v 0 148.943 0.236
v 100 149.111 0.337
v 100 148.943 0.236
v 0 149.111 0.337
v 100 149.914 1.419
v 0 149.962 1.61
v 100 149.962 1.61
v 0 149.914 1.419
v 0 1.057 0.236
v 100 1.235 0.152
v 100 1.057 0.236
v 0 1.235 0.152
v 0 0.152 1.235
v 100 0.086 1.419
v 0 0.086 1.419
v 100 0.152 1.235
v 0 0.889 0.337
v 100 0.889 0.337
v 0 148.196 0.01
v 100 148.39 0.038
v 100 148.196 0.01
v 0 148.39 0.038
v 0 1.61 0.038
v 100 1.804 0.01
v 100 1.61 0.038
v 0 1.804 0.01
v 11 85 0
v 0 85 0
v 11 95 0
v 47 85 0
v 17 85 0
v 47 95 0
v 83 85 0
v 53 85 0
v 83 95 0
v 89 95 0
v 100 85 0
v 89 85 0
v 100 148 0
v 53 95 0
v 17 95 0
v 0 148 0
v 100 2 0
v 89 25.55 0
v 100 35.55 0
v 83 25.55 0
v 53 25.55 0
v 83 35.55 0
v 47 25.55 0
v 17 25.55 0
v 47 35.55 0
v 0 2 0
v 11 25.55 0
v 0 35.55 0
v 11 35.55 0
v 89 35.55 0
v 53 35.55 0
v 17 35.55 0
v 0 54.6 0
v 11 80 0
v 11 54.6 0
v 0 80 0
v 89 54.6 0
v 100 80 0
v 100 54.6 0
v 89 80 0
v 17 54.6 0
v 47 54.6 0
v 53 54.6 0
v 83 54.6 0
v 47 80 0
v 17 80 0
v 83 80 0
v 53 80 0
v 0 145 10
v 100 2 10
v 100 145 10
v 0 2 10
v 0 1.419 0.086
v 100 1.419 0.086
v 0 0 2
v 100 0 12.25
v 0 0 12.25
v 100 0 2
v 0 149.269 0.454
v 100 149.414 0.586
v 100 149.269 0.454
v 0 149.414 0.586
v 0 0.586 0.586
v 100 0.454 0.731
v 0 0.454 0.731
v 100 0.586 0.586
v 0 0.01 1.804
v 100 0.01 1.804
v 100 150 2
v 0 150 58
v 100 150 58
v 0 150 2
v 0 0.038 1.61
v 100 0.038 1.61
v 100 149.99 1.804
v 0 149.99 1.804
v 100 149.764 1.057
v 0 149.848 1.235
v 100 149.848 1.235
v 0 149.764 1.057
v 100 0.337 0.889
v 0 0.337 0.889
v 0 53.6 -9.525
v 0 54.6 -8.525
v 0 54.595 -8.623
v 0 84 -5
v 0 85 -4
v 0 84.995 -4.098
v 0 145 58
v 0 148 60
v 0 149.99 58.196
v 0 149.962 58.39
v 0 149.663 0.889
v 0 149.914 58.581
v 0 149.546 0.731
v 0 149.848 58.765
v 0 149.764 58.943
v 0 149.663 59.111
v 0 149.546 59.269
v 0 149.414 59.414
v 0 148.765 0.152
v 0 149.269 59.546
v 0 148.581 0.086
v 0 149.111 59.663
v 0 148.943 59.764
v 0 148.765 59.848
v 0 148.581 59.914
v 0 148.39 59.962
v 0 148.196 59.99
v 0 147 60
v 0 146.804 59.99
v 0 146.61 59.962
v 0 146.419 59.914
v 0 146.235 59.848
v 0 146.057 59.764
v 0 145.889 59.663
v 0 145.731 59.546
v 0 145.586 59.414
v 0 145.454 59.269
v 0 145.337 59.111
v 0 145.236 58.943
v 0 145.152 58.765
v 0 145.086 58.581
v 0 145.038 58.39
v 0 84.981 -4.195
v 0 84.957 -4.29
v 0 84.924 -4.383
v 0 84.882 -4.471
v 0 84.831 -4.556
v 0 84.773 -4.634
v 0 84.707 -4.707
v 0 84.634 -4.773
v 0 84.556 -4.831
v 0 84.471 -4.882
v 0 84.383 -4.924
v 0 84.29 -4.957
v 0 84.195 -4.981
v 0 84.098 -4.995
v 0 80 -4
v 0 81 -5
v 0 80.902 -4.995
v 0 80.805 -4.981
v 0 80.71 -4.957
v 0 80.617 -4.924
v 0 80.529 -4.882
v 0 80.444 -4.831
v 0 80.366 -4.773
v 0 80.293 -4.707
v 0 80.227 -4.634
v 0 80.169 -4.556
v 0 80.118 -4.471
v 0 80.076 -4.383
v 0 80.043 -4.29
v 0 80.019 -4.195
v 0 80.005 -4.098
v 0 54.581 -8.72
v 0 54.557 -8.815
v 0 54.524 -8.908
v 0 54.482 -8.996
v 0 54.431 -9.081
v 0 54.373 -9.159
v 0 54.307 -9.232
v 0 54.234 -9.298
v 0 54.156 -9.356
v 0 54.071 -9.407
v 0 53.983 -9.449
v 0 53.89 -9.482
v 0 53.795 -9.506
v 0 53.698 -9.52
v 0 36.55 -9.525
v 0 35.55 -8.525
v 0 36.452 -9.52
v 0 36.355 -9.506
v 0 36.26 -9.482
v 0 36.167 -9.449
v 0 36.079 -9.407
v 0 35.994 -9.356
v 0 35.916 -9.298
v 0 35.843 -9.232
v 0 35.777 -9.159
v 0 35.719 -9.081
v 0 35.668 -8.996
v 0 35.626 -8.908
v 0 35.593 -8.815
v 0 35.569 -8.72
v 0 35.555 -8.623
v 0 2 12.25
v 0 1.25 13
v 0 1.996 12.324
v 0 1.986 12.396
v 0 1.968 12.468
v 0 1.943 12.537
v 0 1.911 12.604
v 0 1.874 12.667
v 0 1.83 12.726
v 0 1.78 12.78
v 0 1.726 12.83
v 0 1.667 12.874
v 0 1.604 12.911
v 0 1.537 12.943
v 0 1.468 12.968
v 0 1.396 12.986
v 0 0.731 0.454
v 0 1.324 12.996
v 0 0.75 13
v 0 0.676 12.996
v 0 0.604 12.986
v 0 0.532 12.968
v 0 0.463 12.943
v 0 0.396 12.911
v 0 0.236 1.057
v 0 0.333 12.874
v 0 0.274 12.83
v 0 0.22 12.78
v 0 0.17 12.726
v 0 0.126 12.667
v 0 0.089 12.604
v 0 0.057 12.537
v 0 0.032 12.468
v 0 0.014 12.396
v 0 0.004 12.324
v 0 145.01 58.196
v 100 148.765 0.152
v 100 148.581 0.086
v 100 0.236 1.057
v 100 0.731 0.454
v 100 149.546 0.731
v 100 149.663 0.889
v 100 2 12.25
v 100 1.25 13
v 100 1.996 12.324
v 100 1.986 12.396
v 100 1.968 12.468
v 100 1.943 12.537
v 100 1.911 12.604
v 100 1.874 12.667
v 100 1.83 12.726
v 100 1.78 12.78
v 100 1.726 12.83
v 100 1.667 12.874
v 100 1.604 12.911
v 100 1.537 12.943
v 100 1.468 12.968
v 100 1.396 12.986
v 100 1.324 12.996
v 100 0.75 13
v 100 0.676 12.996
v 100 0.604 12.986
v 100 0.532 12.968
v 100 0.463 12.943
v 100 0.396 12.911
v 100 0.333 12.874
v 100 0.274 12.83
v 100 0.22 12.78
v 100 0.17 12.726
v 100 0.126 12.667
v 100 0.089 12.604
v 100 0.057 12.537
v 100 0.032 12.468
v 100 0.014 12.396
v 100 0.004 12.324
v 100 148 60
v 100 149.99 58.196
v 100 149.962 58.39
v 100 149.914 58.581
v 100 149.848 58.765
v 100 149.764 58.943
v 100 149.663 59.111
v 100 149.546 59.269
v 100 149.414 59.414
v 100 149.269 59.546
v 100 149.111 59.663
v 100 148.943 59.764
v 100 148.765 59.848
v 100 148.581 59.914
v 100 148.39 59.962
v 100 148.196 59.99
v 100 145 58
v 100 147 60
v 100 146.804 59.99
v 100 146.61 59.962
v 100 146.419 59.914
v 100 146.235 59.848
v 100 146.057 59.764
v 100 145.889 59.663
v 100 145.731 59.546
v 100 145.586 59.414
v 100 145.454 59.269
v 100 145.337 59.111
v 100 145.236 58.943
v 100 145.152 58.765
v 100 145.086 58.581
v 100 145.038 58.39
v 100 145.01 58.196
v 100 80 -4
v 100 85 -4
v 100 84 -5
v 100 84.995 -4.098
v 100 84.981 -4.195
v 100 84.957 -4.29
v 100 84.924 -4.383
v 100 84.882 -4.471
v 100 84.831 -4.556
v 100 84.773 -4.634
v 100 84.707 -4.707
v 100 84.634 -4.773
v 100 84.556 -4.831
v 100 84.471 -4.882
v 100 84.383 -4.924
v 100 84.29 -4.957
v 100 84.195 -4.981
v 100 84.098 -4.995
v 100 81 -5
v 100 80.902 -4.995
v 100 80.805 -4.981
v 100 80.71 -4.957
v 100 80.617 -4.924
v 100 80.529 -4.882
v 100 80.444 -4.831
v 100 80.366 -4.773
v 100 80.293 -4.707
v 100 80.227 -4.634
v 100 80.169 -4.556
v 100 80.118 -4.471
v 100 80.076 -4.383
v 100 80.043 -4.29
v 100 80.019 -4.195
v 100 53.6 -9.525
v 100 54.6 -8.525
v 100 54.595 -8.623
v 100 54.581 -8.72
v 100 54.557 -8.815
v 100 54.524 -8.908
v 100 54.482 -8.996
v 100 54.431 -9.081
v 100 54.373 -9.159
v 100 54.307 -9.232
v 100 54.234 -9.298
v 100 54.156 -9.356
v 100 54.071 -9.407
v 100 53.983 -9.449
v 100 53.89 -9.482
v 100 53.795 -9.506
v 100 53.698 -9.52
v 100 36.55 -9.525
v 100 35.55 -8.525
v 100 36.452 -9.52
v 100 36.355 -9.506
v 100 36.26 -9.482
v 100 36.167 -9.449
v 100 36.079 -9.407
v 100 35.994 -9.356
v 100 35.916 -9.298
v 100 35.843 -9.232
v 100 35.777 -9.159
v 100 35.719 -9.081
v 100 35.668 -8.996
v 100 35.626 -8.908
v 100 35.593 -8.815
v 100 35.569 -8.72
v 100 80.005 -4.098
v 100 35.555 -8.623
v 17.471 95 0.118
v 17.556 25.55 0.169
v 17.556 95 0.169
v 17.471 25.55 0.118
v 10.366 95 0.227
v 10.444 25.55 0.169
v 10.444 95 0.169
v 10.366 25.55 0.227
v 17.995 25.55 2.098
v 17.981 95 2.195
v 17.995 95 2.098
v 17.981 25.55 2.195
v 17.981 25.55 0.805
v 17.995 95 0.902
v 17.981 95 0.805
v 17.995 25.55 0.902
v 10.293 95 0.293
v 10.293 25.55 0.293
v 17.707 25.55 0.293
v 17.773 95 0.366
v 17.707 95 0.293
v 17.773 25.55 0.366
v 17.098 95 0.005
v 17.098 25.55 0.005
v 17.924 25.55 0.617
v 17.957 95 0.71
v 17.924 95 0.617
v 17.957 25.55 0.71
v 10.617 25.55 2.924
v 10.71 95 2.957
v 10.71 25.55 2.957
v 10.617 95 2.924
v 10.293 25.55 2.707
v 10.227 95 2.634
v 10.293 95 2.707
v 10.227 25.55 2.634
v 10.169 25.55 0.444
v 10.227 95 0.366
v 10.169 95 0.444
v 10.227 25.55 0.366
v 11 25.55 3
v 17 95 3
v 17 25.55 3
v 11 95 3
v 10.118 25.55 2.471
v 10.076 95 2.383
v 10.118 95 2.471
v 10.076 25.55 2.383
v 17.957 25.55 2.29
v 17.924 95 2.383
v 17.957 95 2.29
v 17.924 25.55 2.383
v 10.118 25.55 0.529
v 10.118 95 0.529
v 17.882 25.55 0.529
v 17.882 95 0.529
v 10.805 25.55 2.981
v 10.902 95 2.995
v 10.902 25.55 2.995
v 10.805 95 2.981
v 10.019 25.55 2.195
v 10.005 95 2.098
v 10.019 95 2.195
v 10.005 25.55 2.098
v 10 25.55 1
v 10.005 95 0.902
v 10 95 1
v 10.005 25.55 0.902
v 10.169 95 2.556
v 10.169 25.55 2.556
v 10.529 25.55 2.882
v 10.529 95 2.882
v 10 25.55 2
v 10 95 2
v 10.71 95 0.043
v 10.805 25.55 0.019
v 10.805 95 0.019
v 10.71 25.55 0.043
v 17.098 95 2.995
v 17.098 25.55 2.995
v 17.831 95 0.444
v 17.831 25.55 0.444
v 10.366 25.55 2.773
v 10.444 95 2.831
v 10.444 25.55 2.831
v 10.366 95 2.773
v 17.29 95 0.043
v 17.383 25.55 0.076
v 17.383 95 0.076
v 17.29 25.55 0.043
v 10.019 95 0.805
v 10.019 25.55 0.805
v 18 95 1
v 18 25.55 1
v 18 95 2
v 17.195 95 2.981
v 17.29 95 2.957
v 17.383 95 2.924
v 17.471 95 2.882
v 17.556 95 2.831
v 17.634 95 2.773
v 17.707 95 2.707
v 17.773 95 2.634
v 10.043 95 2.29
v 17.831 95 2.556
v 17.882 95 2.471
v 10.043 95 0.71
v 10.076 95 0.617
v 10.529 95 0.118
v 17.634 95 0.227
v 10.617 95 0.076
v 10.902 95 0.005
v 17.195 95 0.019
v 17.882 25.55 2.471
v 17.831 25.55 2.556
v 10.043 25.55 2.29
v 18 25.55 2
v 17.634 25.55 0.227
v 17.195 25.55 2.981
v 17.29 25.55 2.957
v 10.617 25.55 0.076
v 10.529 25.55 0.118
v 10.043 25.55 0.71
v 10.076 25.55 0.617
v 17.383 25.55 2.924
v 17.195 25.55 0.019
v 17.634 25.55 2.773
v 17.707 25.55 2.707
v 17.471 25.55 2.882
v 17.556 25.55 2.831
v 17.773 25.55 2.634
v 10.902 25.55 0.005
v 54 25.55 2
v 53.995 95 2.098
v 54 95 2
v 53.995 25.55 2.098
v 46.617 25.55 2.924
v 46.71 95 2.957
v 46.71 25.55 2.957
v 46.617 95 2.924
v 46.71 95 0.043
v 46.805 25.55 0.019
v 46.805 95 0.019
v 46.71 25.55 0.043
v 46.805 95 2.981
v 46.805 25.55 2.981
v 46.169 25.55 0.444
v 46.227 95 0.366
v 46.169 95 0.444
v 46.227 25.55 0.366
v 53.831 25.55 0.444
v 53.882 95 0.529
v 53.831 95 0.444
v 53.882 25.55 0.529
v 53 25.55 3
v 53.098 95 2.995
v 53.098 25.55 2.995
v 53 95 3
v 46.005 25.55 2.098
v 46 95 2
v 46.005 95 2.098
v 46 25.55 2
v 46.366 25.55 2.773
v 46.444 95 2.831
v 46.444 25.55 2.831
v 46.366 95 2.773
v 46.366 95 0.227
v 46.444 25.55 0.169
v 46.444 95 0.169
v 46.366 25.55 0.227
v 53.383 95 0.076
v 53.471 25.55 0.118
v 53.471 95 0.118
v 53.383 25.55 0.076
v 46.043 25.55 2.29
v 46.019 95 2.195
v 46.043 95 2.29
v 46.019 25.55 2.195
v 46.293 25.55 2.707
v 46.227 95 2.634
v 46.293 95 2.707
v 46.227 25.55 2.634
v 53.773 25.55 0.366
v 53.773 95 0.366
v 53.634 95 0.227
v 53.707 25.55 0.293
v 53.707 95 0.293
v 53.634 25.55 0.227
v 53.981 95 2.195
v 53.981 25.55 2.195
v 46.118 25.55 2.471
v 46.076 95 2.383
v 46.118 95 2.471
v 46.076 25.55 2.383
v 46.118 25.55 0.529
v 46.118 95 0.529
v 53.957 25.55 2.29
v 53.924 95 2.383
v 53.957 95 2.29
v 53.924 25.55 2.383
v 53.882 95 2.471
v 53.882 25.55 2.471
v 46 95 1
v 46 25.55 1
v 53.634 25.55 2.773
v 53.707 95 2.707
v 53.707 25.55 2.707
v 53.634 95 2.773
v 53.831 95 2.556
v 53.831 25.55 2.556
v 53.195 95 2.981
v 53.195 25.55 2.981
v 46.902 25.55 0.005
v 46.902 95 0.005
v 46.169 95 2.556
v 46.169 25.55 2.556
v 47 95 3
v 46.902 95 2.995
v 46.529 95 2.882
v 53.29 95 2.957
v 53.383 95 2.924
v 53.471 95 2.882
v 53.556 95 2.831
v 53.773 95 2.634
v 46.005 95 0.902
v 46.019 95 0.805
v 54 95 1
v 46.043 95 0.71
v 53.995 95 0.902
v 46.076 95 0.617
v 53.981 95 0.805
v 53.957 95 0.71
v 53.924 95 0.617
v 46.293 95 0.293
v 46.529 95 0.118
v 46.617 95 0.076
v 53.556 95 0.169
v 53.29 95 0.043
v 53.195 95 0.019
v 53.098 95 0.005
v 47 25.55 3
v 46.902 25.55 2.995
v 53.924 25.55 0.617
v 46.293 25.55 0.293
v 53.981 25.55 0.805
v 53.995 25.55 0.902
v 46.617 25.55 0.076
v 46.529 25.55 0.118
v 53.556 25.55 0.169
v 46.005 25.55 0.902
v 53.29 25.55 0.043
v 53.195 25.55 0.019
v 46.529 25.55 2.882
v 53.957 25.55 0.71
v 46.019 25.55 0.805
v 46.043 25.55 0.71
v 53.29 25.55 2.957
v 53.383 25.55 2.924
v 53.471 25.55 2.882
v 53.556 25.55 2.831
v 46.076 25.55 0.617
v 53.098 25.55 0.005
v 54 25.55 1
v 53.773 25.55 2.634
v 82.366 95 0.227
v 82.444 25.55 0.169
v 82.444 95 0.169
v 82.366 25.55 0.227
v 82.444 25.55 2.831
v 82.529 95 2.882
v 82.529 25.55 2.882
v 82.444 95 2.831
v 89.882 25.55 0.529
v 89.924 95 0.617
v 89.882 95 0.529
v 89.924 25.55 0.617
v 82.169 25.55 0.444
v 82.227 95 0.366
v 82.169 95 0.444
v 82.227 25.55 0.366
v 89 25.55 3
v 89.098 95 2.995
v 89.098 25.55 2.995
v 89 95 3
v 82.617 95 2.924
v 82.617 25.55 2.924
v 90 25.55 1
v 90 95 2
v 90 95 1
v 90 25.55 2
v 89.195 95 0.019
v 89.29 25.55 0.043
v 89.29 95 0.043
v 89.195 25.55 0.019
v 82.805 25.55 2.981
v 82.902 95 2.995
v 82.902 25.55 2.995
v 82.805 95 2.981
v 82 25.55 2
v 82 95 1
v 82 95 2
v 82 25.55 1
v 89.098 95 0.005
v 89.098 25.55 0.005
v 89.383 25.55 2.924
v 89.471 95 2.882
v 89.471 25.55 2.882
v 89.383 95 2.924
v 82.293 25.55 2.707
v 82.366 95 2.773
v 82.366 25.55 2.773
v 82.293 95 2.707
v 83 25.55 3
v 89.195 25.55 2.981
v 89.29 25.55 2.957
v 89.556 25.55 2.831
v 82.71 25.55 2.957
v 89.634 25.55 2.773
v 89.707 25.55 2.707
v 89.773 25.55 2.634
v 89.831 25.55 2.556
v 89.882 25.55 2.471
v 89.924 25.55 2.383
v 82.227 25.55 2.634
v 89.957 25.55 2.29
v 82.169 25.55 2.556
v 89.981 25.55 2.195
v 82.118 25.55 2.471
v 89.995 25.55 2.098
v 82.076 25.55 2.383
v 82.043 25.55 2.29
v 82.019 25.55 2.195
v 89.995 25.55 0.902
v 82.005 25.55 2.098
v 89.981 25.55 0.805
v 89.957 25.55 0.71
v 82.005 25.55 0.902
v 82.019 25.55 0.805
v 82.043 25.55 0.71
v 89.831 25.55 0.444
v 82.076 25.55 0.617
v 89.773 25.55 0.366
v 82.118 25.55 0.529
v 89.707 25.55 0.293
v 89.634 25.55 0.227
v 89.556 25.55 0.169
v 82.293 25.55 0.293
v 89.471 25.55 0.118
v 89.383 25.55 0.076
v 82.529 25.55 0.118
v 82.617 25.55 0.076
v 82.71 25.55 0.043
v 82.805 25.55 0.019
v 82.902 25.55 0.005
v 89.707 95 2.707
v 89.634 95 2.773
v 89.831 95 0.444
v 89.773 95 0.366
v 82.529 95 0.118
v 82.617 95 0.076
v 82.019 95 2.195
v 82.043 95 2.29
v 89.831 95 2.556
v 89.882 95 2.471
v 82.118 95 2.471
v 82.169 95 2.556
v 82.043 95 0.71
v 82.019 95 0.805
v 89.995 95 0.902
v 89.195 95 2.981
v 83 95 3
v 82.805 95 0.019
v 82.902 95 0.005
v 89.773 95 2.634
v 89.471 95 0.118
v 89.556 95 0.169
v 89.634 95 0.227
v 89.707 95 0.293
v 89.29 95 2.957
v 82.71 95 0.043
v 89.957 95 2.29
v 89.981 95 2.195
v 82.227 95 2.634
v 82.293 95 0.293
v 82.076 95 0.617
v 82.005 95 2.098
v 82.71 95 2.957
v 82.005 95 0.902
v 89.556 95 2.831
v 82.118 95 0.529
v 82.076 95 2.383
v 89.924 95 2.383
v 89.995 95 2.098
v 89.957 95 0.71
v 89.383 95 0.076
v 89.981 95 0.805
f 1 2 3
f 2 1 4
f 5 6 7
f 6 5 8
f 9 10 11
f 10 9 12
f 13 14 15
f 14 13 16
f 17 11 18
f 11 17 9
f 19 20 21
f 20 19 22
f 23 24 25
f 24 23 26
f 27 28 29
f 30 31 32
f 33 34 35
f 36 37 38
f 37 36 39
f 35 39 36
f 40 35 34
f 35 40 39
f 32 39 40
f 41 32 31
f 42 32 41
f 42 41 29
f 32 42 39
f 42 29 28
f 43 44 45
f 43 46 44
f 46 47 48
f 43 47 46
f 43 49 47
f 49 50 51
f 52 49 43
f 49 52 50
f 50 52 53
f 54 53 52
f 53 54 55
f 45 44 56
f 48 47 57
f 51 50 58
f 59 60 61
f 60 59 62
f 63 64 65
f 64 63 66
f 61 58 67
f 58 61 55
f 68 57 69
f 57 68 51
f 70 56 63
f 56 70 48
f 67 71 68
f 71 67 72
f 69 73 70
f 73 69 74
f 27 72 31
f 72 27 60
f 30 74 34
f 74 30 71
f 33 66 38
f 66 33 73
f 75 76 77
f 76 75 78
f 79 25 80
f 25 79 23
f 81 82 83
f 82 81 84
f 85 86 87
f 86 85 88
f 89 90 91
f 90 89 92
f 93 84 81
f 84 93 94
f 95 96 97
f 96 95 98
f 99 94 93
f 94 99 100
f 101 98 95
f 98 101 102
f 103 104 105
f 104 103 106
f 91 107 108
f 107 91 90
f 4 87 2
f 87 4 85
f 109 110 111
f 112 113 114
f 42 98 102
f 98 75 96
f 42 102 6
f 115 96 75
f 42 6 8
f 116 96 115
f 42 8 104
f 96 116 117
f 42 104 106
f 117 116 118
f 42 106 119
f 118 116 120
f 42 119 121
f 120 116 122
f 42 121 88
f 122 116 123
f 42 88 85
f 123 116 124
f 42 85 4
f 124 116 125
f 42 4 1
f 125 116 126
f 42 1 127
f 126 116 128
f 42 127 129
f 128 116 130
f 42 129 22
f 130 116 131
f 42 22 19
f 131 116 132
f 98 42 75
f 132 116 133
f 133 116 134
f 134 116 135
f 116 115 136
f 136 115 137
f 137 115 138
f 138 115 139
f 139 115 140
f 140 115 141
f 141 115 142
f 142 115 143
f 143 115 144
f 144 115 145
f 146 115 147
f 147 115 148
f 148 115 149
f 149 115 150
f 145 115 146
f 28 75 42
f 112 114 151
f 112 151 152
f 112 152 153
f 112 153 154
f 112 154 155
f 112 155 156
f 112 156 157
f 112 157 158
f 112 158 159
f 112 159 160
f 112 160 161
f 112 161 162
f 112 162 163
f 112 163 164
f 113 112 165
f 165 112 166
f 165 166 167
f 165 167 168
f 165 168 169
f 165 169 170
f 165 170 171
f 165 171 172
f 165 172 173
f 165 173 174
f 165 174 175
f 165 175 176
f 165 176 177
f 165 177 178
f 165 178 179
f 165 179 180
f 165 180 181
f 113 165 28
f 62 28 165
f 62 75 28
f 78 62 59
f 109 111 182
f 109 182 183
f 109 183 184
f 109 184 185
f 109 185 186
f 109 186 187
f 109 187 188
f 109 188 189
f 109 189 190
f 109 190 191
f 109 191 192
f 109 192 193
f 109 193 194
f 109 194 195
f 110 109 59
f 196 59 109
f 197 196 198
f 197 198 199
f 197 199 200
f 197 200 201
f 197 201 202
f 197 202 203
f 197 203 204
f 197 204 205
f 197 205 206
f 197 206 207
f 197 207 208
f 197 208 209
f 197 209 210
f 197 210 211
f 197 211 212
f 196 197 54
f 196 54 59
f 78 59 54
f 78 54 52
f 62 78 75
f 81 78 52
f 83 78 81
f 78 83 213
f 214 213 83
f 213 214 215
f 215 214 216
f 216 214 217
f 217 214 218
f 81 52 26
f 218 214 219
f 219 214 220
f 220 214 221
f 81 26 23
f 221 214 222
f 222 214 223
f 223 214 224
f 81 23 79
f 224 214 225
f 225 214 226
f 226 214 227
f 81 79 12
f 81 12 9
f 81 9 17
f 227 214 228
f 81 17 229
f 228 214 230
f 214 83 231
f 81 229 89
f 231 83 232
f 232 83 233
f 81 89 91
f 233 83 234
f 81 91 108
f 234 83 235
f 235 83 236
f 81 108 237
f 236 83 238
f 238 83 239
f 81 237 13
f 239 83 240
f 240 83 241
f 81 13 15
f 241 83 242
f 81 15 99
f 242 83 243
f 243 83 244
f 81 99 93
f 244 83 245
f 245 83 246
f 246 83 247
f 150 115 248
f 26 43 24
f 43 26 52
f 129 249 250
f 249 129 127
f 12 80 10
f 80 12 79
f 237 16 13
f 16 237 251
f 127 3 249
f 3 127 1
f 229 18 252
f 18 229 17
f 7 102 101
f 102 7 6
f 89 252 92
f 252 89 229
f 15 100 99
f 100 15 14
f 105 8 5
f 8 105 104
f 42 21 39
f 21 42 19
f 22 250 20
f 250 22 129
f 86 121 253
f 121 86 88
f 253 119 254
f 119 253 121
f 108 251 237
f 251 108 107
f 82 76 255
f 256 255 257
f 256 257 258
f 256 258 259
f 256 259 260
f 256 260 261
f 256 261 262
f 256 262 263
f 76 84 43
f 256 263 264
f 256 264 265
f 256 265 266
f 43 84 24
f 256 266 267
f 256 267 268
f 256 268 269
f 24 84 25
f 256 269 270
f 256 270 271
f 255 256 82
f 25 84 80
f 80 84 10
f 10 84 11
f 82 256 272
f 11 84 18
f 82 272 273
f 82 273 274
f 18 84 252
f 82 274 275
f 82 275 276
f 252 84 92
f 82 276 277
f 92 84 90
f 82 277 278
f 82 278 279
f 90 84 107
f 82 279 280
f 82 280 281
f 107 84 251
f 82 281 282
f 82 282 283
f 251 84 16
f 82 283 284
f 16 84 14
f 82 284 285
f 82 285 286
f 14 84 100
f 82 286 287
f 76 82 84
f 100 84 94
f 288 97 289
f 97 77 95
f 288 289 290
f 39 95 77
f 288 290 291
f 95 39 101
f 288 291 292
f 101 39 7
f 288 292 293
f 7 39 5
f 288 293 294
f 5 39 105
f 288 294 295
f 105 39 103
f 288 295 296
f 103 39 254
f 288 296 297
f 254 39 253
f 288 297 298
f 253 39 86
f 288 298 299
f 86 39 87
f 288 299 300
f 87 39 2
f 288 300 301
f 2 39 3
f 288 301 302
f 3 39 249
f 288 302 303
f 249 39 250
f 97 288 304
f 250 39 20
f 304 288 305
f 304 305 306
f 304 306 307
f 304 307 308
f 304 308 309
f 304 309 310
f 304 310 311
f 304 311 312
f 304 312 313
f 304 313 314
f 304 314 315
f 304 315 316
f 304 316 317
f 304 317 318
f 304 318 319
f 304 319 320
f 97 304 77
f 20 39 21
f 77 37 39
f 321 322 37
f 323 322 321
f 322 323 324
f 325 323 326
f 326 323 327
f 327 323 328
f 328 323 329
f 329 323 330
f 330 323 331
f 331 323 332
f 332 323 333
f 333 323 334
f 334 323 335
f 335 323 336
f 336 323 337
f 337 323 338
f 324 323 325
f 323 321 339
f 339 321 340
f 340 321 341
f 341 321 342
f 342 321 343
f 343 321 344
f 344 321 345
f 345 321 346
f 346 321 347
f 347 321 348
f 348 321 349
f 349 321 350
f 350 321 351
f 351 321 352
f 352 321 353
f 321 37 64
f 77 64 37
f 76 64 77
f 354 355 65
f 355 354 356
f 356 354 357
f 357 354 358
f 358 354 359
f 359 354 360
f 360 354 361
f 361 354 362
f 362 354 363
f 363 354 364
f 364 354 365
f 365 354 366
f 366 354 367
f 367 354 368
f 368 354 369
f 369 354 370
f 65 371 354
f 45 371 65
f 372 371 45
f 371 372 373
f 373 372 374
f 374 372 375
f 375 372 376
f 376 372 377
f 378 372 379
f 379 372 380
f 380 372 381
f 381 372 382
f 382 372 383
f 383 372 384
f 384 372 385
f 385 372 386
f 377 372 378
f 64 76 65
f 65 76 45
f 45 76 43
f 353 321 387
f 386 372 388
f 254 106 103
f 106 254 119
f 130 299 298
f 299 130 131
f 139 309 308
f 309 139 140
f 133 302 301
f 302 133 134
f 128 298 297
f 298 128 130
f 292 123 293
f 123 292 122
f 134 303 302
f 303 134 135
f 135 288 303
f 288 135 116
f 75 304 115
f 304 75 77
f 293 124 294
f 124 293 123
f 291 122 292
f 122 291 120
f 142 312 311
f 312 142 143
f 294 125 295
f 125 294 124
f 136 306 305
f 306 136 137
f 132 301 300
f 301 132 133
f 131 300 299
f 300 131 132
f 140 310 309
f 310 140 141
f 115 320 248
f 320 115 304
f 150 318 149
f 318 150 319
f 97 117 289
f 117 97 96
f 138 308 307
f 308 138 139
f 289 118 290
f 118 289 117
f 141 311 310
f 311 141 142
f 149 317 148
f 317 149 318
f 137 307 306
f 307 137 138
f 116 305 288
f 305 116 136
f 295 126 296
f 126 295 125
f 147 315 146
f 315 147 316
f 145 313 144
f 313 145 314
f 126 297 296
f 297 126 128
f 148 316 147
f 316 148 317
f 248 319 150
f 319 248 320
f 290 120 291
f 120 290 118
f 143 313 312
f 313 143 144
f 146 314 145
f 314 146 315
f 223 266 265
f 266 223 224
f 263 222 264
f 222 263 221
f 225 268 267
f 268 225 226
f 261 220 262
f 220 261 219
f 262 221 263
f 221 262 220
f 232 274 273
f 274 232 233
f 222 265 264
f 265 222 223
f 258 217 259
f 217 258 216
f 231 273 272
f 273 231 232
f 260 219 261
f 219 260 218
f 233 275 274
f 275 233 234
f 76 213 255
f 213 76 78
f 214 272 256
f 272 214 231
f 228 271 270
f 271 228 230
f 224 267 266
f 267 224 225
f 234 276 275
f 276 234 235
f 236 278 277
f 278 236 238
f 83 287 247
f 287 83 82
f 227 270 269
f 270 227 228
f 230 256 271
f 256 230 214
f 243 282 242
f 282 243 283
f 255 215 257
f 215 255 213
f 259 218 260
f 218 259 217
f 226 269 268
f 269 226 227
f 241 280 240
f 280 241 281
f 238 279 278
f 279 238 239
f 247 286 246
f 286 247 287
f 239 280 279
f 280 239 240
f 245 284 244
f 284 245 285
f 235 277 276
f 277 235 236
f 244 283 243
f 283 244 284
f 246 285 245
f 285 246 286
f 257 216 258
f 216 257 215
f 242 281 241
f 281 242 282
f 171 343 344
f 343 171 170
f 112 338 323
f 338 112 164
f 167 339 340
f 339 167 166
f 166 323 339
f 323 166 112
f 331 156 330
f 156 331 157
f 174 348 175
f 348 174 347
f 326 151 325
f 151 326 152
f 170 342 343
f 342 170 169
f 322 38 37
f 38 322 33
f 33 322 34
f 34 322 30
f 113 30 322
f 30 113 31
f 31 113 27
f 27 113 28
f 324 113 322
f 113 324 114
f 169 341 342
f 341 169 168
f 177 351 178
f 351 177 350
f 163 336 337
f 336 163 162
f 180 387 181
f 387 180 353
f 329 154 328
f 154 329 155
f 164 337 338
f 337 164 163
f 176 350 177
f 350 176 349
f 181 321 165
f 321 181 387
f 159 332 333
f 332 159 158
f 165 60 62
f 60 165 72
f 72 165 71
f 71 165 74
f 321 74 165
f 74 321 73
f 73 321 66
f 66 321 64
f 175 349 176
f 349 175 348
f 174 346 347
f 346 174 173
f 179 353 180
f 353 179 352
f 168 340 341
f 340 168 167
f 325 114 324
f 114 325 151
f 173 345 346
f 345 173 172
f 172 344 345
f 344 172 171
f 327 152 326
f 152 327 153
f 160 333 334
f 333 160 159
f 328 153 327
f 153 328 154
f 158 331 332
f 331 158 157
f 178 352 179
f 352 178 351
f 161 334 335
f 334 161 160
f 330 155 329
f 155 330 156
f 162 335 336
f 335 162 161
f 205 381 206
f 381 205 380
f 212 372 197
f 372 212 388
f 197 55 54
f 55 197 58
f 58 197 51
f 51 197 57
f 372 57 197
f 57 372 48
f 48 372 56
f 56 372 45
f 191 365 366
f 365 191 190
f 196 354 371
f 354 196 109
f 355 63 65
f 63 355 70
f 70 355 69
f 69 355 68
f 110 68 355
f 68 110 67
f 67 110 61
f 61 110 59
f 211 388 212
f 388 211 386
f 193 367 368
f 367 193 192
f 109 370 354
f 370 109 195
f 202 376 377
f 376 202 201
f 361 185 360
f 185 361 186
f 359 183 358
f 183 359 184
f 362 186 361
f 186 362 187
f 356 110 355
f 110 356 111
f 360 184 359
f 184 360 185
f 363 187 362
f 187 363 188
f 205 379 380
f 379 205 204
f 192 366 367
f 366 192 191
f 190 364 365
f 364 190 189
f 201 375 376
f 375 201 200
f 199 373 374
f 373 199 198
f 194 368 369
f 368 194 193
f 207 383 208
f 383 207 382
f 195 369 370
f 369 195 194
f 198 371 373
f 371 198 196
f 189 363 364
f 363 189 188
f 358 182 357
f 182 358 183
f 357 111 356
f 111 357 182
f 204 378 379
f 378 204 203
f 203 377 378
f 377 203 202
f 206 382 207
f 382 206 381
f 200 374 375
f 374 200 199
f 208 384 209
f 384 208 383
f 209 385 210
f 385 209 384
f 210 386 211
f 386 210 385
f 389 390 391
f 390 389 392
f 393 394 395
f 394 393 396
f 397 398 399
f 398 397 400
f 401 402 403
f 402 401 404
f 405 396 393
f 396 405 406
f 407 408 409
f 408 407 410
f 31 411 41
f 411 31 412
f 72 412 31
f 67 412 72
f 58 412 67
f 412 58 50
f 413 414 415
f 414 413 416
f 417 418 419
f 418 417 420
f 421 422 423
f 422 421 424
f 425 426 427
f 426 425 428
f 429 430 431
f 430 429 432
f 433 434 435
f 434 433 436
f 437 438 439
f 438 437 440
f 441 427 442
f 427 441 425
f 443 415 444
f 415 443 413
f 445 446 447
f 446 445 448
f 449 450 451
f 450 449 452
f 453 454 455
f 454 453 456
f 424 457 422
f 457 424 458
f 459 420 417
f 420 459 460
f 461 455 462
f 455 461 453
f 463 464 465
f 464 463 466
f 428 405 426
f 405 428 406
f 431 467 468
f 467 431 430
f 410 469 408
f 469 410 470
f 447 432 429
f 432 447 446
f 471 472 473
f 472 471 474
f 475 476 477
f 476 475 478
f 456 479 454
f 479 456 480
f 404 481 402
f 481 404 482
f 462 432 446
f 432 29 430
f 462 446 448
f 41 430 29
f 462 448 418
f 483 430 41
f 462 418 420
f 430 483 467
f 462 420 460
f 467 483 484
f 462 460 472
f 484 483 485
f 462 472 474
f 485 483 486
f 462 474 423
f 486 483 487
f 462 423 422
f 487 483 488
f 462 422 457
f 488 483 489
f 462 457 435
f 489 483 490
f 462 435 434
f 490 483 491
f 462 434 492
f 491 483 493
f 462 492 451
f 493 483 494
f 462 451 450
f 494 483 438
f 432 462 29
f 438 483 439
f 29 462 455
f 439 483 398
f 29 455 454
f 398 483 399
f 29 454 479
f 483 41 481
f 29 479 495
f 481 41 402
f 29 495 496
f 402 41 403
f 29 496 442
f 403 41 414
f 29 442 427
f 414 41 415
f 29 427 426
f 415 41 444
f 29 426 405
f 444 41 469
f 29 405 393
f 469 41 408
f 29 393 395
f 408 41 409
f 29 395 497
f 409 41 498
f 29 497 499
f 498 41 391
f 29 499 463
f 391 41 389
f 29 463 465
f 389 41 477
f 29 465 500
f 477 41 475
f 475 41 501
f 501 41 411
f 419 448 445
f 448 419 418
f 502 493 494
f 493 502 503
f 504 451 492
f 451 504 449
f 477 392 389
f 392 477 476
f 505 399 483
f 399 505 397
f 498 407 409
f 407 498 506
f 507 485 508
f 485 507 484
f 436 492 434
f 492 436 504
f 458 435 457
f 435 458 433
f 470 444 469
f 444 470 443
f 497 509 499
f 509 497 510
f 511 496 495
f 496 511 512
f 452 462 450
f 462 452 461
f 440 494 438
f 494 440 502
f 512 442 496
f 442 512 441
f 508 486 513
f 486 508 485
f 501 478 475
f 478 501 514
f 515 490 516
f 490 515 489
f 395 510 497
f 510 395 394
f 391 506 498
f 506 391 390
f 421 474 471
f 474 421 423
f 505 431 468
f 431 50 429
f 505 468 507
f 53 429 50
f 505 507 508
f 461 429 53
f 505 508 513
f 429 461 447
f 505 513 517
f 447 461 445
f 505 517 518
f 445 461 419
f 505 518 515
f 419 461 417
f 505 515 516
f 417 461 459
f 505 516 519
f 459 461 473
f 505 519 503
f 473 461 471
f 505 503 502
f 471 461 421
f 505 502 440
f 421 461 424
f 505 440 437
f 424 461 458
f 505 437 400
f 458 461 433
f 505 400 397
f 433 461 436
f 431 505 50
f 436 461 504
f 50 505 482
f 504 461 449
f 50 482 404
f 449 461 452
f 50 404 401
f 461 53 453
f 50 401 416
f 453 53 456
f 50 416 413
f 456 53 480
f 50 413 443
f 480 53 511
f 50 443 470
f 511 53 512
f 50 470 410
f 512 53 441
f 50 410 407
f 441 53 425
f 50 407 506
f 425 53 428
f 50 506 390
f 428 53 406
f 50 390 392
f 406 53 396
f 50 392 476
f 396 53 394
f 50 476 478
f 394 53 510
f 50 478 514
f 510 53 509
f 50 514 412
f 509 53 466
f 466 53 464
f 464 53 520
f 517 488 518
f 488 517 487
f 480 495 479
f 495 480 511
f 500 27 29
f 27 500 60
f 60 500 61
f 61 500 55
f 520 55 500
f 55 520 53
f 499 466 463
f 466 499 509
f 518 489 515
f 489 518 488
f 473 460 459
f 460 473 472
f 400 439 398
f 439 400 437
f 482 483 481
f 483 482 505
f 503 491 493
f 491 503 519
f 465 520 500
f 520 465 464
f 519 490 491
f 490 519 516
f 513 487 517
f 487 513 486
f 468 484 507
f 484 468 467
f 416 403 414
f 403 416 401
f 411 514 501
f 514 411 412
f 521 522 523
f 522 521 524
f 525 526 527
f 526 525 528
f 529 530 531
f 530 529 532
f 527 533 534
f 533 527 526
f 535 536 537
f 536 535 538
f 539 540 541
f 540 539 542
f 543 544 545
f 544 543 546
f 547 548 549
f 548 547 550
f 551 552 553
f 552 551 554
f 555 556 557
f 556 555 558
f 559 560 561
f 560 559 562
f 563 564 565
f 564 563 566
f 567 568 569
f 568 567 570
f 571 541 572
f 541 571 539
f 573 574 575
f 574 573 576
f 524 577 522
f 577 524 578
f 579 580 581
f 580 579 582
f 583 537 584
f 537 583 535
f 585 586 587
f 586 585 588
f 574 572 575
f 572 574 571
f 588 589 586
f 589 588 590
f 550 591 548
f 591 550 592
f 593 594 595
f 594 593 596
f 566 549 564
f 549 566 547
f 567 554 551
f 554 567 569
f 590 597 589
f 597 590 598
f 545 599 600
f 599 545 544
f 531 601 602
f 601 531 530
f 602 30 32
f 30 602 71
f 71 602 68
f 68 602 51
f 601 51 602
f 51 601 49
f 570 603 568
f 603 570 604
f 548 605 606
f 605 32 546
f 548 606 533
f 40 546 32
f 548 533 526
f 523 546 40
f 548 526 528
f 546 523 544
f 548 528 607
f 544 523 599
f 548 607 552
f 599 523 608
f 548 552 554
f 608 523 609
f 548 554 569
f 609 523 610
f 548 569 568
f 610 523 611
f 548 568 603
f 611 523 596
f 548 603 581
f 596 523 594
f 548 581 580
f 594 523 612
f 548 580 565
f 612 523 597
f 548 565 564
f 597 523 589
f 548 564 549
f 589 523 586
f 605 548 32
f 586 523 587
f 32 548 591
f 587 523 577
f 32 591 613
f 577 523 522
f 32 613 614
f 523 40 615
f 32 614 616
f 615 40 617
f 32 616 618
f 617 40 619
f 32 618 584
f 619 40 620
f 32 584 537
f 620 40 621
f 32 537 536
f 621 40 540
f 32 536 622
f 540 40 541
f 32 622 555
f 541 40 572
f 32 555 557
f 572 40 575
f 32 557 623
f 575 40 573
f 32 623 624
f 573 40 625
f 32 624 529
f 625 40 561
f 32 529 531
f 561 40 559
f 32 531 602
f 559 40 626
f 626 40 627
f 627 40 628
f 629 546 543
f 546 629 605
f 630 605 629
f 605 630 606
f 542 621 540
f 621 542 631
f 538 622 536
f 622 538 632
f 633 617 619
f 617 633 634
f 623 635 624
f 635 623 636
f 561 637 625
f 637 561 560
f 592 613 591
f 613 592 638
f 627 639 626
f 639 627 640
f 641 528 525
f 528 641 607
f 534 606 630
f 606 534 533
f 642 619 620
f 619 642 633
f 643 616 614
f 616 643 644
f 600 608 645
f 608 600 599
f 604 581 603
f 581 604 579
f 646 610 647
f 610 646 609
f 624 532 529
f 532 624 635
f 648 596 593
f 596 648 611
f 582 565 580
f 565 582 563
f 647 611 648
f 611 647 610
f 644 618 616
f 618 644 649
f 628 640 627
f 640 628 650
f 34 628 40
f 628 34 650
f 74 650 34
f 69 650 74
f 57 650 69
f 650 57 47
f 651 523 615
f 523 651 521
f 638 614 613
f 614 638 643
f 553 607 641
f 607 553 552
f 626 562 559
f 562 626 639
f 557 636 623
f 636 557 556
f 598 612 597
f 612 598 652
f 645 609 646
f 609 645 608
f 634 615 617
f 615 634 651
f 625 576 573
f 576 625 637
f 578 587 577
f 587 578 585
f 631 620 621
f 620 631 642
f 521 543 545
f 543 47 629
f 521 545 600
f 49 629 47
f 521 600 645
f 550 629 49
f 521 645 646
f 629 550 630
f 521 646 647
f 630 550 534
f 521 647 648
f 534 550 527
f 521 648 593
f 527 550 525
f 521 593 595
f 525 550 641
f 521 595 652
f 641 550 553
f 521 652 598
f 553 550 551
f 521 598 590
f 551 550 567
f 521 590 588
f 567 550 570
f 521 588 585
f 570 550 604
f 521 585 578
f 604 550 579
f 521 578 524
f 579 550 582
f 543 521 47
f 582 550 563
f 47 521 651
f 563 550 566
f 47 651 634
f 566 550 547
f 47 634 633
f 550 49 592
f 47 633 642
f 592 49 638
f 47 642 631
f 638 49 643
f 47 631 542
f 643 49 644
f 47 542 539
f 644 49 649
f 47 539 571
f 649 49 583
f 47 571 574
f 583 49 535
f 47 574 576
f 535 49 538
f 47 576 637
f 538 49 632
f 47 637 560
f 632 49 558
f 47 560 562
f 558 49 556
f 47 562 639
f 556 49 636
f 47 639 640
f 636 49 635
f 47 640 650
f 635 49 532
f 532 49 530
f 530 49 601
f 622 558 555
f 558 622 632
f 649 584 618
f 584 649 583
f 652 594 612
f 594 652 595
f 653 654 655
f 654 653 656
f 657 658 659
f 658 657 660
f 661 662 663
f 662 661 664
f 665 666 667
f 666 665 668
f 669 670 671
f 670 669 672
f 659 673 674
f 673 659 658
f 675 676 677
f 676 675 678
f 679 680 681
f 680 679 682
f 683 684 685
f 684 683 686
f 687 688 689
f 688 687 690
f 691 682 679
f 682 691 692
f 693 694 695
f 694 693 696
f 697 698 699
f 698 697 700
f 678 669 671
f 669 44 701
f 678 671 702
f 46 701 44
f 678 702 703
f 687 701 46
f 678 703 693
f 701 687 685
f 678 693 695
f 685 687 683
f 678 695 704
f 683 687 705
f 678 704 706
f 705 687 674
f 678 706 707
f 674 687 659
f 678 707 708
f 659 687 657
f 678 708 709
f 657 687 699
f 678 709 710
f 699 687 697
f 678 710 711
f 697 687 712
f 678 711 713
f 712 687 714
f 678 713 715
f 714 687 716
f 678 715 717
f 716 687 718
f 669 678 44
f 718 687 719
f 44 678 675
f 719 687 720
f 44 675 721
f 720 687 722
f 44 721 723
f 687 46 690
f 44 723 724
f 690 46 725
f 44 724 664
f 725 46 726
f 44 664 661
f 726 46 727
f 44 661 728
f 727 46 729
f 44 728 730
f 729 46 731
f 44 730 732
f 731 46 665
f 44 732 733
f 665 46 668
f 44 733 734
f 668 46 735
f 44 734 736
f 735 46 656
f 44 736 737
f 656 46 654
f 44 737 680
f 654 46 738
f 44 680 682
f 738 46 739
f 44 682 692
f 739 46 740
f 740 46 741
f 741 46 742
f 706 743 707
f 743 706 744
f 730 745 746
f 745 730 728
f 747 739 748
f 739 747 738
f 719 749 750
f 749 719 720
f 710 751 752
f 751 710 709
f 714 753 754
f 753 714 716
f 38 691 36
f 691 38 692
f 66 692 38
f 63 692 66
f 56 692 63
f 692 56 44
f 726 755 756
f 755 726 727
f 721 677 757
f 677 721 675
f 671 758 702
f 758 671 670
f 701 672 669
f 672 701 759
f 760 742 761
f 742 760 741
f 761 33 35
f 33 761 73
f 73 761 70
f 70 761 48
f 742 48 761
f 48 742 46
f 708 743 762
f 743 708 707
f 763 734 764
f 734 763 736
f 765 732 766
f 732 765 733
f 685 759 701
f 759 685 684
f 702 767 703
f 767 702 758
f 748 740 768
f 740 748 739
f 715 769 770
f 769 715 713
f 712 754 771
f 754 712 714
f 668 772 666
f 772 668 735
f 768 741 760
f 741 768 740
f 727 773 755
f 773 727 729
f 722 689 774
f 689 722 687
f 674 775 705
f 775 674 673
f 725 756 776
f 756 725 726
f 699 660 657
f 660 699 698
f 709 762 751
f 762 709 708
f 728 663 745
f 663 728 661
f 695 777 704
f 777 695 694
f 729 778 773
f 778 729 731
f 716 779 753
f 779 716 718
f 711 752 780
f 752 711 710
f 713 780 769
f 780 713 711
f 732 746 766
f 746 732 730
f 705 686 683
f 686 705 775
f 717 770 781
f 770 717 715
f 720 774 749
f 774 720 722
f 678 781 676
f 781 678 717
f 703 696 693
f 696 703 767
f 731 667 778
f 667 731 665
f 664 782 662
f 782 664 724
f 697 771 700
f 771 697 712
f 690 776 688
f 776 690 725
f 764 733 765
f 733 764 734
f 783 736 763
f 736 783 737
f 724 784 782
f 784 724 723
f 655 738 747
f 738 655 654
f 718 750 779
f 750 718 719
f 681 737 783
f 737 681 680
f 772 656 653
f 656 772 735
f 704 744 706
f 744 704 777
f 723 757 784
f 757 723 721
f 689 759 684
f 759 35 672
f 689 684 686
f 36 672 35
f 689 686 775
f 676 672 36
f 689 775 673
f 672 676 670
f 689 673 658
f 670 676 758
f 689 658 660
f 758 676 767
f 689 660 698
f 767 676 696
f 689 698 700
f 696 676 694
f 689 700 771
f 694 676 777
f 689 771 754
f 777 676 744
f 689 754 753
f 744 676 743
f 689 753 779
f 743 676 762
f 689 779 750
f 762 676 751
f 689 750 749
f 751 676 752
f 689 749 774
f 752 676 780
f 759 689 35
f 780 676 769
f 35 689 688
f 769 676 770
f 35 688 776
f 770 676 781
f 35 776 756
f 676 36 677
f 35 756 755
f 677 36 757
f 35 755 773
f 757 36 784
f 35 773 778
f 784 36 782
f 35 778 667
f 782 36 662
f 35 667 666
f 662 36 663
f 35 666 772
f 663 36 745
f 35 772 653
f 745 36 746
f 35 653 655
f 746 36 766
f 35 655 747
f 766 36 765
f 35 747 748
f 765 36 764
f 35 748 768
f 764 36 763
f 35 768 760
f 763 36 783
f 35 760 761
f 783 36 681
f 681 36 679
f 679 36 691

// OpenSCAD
// file: 72-inch-cosco-profile.scad
// 72-inch Cosco shelf profile.
//
// Overrides the bar / front-lip dimensions in bar_shelf.scad to fit a
// 72-inch Cosco shelving rail. Include this BEFORE bar_shelf.scad in any
// wrapper that should use the Cosco profile.
border_ridge_override     = 25.4;    // 1"
border_depth_override     = 19.05;   // 3/4"
border_height_override    = 9.525;   // 3/8"
rear_wall_height_override = 5;       // shorter rear lip than 77-inch industrial
// main file
// 100mm-wide 72-inch Cosco shelf — see bar_shelf.scad for the design.
include <72-inch-cosco-profile.scad>
shelf_width_override = 100;
include <bar_shelf.scad>
